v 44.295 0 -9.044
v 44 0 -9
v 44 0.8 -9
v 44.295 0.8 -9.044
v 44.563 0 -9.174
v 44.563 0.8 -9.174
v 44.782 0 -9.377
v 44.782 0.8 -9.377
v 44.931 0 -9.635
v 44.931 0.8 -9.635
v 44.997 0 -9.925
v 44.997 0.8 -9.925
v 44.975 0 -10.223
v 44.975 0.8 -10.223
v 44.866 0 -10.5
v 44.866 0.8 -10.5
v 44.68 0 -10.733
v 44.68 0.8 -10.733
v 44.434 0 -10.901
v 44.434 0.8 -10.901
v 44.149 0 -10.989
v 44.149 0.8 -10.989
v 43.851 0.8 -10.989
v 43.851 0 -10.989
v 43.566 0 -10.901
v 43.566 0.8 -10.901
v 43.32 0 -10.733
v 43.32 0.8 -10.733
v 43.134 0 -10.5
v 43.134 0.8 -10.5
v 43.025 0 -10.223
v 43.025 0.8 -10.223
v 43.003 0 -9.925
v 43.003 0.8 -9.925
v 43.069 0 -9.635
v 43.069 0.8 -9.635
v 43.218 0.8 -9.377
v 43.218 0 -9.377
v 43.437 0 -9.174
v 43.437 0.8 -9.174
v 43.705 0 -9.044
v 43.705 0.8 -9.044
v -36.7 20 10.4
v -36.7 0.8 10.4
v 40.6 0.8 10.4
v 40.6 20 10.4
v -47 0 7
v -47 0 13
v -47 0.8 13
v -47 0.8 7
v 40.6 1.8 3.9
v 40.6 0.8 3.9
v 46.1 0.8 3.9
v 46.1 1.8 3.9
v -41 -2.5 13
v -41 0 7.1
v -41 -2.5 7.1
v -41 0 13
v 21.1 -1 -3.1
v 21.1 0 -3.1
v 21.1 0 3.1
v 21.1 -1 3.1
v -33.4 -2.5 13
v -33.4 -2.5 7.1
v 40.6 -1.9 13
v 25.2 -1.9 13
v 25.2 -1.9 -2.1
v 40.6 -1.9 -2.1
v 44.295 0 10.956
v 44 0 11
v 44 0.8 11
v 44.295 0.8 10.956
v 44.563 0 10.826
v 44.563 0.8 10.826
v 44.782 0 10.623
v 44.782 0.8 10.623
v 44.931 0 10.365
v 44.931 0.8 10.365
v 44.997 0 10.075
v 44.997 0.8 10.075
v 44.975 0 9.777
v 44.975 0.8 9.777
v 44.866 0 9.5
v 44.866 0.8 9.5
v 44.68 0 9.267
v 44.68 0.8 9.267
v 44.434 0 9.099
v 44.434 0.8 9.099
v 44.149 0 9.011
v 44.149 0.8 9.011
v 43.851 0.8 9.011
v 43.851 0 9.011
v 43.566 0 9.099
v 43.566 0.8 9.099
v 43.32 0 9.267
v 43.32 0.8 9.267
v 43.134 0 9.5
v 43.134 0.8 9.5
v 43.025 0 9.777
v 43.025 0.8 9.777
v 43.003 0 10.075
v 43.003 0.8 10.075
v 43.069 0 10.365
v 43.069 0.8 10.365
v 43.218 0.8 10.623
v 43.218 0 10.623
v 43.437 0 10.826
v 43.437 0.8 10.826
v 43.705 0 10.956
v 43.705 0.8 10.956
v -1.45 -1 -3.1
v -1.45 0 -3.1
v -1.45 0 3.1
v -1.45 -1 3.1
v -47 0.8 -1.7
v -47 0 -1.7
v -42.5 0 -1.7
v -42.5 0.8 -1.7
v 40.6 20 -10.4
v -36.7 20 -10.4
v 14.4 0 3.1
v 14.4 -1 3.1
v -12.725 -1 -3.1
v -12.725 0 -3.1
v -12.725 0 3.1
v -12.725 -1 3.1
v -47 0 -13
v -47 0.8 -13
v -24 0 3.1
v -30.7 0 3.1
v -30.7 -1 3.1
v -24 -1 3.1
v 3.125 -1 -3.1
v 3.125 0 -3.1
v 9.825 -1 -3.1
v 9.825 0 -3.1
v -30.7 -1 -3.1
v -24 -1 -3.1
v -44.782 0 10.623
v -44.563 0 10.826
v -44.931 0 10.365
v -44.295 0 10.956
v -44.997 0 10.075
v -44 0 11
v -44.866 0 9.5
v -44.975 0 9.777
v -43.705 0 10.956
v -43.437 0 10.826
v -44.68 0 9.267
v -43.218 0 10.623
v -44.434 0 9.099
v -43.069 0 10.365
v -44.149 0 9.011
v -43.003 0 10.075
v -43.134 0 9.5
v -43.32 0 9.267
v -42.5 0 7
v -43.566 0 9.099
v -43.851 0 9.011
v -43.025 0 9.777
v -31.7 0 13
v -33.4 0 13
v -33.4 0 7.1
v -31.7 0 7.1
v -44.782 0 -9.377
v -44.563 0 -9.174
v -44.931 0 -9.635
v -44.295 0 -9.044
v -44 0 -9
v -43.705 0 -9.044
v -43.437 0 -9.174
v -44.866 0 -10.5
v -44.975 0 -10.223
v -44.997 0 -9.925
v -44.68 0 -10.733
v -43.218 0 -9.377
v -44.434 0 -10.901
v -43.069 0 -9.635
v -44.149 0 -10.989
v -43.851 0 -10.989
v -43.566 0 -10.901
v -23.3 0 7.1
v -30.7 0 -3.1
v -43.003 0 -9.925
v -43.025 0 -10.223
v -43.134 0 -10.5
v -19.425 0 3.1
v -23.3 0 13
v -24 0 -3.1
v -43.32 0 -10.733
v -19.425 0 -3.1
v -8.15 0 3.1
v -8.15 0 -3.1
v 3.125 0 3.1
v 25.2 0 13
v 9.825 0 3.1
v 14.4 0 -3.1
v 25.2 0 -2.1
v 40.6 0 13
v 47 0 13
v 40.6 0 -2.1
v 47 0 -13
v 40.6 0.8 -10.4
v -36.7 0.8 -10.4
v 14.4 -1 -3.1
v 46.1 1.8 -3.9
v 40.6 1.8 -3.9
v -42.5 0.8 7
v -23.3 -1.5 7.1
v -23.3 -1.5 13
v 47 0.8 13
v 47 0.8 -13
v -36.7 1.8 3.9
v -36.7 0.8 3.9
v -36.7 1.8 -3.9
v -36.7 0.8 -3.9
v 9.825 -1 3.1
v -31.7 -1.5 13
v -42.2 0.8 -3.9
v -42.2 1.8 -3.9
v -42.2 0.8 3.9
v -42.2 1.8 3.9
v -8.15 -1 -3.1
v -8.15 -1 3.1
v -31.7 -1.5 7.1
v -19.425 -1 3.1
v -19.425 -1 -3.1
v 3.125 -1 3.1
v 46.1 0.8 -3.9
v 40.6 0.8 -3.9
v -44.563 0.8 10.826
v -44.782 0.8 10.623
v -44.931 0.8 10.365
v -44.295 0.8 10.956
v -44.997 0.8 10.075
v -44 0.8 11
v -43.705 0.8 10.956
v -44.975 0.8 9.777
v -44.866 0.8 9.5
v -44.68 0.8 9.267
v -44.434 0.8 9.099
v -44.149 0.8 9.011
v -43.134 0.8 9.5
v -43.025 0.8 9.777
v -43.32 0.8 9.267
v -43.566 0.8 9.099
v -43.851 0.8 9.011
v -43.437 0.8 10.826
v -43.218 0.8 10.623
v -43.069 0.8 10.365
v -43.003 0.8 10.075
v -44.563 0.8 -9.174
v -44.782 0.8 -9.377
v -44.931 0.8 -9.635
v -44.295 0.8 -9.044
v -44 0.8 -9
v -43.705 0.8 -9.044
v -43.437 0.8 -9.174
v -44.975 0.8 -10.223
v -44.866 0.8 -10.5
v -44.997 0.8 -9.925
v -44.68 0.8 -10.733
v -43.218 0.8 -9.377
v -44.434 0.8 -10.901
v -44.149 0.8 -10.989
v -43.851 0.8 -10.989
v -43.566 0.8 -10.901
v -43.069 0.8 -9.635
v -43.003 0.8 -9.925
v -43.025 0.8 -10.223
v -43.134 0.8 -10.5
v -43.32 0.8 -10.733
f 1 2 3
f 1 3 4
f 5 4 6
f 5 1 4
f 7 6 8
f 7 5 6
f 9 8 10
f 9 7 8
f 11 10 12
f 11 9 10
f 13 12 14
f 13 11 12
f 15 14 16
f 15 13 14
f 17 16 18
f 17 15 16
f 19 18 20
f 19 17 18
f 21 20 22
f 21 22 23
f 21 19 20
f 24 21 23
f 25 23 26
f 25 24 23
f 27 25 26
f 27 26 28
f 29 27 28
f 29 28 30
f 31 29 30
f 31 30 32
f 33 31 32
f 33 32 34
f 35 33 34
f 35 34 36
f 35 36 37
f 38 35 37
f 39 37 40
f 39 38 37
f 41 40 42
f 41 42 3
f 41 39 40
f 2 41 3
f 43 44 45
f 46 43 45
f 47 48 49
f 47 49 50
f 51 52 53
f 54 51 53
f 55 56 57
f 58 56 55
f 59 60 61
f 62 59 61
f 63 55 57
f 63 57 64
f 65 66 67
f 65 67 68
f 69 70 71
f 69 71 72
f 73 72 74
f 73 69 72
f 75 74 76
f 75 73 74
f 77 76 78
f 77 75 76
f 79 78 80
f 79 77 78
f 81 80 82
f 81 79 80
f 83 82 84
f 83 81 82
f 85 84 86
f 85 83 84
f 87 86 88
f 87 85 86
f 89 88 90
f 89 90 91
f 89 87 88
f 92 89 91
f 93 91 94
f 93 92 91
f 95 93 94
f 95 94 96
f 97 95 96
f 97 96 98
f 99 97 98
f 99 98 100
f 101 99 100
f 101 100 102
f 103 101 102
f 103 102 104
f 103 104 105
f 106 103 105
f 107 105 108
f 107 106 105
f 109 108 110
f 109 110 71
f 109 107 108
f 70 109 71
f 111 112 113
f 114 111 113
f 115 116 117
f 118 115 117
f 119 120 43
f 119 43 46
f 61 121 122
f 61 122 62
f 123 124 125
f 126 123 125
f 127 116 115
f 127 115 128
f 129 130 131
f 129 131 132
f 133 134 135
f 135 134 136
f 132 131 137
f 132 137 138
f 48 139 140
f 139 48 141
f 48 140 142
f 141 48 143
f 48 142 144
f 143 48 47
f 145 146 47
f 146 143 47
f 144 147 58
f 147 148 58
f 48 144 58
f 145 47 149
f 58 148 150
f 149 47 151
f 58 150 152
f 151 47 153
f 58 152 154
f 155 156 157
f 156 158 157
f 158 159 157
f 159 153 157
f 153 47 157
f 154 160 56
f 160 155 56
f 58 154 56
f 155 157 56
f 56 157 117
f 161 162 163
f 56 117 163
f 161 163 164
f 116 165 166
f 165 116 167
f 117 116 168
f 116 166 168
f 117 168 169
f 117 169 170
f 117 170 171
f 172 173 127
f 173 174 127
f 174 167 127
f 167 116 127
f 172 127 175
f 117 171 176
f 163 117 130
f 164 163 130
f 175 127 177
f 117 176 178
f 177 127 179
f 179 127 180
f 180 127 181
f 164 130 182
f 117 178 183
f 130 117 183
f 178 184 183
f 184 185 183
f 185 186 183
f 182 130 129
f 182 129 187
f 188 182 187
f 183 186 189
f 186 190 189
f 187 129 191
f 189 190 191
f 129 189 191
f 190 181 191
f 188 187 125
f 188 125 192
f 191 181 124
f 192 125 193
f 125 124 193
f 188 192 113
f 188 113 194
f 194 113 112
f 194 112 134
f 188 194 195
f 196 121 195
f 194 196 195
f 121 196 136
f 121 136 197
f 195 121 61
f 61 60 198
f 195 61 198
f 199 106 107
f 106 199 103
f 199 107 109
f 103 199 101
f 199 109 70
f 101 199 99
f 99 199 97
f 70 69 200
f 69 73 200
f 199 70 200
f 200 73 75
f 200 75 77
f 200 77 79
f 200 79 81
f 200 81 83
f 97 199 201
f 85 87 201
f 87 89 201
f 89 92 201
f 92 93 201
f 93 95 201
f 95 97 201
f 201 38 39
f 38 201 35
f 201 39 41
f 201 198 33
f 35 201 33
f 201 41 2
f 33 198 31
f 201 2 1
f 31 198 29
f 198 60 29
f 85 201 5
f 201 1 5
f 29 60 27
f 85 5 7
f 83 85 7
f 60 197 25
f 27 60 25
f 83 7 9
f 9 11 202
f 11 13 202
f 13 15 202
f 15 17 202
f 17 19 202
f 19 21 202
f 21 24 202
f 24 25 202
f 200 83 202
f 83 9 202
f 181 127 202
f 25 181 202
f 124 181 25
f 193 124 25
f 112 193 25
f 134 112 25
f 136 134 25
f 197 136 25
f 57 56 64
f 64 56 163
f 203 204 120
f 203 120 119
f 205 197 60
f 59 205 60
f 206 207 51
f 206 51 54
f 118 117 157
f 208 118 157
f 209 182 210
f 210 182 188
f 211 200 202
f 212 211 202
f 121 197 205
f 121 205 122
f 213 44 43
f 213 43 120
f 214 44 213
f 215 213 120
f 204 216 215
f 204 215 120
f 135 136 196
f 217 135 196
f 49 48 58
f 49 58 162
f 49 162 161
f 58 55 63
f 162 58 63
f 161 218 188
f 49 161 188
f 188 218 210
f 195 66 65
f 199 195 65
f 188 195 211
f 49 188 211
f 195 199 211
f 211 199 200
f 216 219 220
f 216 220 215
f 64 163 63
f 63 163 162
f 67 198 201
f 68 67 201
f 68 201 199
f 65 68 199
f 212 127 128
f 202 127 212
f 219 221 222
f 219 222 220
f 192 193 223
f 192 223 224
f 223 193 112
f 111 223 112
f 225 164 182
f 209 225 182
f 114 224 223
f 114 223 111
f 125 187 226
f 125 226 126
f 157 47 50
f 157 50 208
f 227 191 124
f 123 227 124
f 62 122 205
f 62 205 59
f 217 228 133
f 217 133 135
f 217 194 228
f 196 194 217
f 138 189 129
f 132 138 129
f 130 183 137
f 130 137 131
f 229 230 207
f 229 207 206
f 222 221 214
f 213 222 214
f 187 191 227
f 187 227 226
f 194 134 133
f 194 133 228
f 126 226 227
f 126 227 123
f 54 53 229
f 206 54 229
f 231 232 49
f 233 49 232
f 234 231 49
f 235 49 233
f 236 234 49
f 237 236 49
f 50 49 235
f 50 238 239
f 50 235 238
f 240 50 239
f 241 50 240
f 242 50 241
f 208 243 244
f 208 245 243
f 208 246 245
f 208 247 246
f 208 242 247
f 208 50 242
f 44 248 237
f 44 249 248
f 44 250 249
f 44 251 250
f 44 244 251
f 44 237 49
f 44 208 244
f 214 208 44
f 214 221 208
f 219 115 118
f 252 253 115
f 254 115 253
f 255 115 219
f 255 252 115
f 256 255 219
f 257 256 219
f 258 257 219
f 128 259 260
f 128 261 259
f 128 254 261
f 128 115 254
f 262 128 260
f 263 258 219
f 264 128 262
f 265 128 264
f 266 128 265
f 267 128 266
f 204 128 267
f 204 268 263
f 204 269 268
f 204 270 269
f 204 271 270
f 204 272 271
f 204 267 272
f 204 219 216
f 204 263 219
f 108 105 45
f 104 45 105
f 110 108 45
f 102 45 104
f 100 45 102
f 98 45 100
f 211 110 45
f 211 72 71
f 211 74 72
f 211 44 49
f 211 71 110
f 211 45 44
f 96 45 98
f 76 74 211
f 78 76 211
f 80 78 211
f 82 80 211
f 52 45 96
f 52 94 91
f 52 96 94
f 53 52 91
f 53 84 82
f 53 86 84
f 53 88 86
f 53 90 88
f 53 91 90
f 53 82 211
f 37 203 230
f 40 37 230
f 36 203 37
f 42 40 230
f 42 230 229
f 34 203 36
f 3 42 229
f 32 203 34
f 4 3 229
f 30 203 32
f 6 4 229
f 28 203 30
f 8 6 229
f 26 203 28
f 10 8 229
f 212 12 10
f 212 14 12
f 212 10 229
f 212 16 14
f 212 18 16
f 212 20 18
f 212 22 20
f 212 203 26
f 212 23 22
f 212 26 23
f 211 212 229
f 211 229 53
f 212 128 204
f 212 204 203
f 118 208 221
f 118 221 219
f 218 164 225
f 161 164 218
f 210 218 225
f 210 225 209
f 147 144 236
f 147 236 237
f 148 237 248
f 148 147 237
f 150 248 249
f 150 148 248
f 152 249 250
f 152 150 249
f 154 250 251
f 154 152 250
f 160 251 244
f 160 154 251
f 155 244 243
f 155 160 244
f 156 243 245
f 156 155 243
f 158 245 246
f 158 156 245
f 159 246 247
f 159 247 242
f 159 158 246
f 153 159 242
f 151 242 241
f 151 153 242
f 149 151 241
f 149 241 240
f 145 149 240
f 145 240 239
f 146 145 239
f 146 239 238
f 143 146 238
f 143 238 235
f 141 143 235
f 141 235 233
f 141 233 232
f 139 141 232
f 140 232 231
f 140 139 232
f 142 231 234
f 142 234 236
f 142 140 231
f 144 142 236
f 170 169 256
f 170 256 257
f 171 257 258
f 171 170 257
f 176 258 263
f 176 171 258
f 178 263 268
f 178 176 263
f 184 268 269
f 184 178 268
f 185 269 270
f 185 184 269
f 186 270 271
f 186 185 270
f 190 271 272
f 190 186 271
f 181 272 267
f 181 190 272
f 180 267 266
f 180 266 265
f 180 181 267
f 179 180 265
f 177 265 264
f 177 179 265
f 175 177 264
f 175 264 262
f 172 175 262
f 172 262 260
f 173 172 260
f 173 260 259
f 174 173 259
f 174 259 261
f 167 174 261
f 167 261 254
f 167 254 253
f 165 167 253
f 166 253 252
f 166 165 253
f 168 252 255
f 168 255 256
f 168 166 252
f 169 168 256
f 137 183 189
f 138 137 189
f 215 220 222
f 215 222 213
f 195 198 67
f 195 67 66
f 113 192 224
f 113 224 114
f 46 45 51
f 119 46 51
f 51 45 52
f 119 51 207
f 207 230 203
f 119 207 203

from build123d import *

# Parameters (mm, degrees)
SKETCH_1_W          = 94
SKETCH_1_H          = 26
SKETCH_1_R          = 1
EXTRUDE_1_DEPTH     = 0.8
SKETCH_2_W          = 5.5
SKETCH_2_H          = 7.8
EXTRUDE_2_DEPTH     = 1
SKETCH_2_3_W        = 77.3
SKETCH_2_3_H        = 20.8
EXTRUDE_3_DEPTH     = 19.2
SKETCH_3_W          = 15.4
SKETCH_3_H          = 15.1
EXTRUDE_4_DEPTH     = 1.9
SKETCH_3_3_W        = 6.7
SKETCH_3_3_H        = 6.2
EXTRUDE_5_DEPTH     = 1
SKETCH_3_4_W        = 8.4
SKETCH_3_4_H        = 5.9
EXTRUDE_6_DEPTH     = 1.5
SKETCH_3_5_W        = 7.6
SKETCH_3_5_H        = 5.9
EXTRUDE_7_DEPTH     = 2.5
SKETCH_3_6_W        = 4.5
SKETCH_3_6_H        = 8.7
CUT_EXTRUDE_1_DEPTH = 53.706735812


with BuildPart() as part:
    # 草图1 → 凸台-拉伸1 (new body)
    with BuildSketch(Plane(origin=(0, 0, 0), x_dir=(1, 0, 0), z_dir=(0, 1, 0))):
        Rectangle(SKETCH_1_W, SKETCH_1_H)
        with Locations((-44, 10)):
            Circle(SKETCH_1_R, mode=Mode.SUBTRACT)
        with Locations((-44, -10)):
            Circle(SKETCH_1_R, mode=Mode.SUBTRACT)
        with Locations((44, 10)):
            Circle(SKETCH_1_R, mode=Mode.SUBTRACT)
        with Locations((44, -10)):
            Circle(SKETCH_1_R, mode=Mode.SUBTRACT)
    extrude(amount=EXTRUDE_1_DEPTH)

    # 草图2 → 凸台-拉伸2 (add)
    with BuildSketch(Plane(origin=(0, 0.8, 0), x_dir=(1, 0, 0), z_dir=(0, 1, 0))):
        with Locations((-39.45, 0)):
            Rectangle(SKETCH_2_W, SKETCH_2_H)
        with Locations((43.35, 0)):
            Rectangle(SKETCH_2_W, SKETCH_2_H)
    extrude(amount=EXTRUDE_2_DEPTH)

    # 草图2<3> → 凸台-拉伸3 (add)
    with BuildSketch(Plane(origin=(0, 0.8, 0), x_dir=(1, 0, 0), z_dir=(0, 1, 0))):
        with Locations((1.95, 0)):
            Rectangle(SKETCH_2_3_W, SKETCH_2_3_H)
    extrude(amount=EXTRUDE_3_DEPTH)

    # 草图3 → 凸台-拉伸4 (add)
    with BuildSketch(Plane.XZ):
        with Locations((32.9, 5.45)):
            Rectangle(SKETCH_3_W, SKETCH_3_H)
    extrude(amount=EXTRUDE_4_DEPTH)

    # 草图3<3> → 凸台-拉伸5 (add)
    with BuildSketch(Plane.XZ):
        with Locations((-27.35, 0)):
            Rectangle(SKETCH_3_3_W, SKETCH_3_3_H)
        with Locations((-16.075, 0)):
            Rectangle(SKETCH_3_3_W, SKETCH_3_3_H)
        with Locations((-4.8, 0)):
            Rectangle(SKETCH_3_3_W, SKETCH_3_3_H)
        with Locations((6.475, 0)):
            Rectangle(SKETCH_3_3_W, SKETCH_3_3_H)
        with Locations((17.75, 0)):
            Rectangle(SKETCH_3_3_W, SKETCH_3_3_H)
    extrude(amount=EXTRUDE_5_DEPTH)

    # 草图3<4> → 凸台-拉伸6 (add)
    with BuildSketch(Plane.XZ):
        with Locations((-27.5, 10.05)):
            Rectangle(SKETCH_3_4_W, SKETCH_3_4_H)
    extrude(amount=EXTRUDE_6_DEPTH)

    # 草图3<5> → 凸台-拉伸7 (add)
    with BuildSketch(Plane.XZ):
        with Locations((-37.2, 10.05)):
            Rectangle(SKETCH_3_5_W, SKETCH_3_5_H)
    extrude(amount=EXTRUDE_7_DEPTH)

    # 草图3<6> → 切除-拉伸1 (cut, through all)
    with BuildSketch(Plane.XZ):
        with Locations((-44.75, 2.65)):
            Rectangle(SKETCH_3_6_W, SKETCH_3_6_H)
    extrude(amount=-CUT_EXTRUDE_1_DEPTH, mode=Mode.SUBTRACT)


solid = part.part
